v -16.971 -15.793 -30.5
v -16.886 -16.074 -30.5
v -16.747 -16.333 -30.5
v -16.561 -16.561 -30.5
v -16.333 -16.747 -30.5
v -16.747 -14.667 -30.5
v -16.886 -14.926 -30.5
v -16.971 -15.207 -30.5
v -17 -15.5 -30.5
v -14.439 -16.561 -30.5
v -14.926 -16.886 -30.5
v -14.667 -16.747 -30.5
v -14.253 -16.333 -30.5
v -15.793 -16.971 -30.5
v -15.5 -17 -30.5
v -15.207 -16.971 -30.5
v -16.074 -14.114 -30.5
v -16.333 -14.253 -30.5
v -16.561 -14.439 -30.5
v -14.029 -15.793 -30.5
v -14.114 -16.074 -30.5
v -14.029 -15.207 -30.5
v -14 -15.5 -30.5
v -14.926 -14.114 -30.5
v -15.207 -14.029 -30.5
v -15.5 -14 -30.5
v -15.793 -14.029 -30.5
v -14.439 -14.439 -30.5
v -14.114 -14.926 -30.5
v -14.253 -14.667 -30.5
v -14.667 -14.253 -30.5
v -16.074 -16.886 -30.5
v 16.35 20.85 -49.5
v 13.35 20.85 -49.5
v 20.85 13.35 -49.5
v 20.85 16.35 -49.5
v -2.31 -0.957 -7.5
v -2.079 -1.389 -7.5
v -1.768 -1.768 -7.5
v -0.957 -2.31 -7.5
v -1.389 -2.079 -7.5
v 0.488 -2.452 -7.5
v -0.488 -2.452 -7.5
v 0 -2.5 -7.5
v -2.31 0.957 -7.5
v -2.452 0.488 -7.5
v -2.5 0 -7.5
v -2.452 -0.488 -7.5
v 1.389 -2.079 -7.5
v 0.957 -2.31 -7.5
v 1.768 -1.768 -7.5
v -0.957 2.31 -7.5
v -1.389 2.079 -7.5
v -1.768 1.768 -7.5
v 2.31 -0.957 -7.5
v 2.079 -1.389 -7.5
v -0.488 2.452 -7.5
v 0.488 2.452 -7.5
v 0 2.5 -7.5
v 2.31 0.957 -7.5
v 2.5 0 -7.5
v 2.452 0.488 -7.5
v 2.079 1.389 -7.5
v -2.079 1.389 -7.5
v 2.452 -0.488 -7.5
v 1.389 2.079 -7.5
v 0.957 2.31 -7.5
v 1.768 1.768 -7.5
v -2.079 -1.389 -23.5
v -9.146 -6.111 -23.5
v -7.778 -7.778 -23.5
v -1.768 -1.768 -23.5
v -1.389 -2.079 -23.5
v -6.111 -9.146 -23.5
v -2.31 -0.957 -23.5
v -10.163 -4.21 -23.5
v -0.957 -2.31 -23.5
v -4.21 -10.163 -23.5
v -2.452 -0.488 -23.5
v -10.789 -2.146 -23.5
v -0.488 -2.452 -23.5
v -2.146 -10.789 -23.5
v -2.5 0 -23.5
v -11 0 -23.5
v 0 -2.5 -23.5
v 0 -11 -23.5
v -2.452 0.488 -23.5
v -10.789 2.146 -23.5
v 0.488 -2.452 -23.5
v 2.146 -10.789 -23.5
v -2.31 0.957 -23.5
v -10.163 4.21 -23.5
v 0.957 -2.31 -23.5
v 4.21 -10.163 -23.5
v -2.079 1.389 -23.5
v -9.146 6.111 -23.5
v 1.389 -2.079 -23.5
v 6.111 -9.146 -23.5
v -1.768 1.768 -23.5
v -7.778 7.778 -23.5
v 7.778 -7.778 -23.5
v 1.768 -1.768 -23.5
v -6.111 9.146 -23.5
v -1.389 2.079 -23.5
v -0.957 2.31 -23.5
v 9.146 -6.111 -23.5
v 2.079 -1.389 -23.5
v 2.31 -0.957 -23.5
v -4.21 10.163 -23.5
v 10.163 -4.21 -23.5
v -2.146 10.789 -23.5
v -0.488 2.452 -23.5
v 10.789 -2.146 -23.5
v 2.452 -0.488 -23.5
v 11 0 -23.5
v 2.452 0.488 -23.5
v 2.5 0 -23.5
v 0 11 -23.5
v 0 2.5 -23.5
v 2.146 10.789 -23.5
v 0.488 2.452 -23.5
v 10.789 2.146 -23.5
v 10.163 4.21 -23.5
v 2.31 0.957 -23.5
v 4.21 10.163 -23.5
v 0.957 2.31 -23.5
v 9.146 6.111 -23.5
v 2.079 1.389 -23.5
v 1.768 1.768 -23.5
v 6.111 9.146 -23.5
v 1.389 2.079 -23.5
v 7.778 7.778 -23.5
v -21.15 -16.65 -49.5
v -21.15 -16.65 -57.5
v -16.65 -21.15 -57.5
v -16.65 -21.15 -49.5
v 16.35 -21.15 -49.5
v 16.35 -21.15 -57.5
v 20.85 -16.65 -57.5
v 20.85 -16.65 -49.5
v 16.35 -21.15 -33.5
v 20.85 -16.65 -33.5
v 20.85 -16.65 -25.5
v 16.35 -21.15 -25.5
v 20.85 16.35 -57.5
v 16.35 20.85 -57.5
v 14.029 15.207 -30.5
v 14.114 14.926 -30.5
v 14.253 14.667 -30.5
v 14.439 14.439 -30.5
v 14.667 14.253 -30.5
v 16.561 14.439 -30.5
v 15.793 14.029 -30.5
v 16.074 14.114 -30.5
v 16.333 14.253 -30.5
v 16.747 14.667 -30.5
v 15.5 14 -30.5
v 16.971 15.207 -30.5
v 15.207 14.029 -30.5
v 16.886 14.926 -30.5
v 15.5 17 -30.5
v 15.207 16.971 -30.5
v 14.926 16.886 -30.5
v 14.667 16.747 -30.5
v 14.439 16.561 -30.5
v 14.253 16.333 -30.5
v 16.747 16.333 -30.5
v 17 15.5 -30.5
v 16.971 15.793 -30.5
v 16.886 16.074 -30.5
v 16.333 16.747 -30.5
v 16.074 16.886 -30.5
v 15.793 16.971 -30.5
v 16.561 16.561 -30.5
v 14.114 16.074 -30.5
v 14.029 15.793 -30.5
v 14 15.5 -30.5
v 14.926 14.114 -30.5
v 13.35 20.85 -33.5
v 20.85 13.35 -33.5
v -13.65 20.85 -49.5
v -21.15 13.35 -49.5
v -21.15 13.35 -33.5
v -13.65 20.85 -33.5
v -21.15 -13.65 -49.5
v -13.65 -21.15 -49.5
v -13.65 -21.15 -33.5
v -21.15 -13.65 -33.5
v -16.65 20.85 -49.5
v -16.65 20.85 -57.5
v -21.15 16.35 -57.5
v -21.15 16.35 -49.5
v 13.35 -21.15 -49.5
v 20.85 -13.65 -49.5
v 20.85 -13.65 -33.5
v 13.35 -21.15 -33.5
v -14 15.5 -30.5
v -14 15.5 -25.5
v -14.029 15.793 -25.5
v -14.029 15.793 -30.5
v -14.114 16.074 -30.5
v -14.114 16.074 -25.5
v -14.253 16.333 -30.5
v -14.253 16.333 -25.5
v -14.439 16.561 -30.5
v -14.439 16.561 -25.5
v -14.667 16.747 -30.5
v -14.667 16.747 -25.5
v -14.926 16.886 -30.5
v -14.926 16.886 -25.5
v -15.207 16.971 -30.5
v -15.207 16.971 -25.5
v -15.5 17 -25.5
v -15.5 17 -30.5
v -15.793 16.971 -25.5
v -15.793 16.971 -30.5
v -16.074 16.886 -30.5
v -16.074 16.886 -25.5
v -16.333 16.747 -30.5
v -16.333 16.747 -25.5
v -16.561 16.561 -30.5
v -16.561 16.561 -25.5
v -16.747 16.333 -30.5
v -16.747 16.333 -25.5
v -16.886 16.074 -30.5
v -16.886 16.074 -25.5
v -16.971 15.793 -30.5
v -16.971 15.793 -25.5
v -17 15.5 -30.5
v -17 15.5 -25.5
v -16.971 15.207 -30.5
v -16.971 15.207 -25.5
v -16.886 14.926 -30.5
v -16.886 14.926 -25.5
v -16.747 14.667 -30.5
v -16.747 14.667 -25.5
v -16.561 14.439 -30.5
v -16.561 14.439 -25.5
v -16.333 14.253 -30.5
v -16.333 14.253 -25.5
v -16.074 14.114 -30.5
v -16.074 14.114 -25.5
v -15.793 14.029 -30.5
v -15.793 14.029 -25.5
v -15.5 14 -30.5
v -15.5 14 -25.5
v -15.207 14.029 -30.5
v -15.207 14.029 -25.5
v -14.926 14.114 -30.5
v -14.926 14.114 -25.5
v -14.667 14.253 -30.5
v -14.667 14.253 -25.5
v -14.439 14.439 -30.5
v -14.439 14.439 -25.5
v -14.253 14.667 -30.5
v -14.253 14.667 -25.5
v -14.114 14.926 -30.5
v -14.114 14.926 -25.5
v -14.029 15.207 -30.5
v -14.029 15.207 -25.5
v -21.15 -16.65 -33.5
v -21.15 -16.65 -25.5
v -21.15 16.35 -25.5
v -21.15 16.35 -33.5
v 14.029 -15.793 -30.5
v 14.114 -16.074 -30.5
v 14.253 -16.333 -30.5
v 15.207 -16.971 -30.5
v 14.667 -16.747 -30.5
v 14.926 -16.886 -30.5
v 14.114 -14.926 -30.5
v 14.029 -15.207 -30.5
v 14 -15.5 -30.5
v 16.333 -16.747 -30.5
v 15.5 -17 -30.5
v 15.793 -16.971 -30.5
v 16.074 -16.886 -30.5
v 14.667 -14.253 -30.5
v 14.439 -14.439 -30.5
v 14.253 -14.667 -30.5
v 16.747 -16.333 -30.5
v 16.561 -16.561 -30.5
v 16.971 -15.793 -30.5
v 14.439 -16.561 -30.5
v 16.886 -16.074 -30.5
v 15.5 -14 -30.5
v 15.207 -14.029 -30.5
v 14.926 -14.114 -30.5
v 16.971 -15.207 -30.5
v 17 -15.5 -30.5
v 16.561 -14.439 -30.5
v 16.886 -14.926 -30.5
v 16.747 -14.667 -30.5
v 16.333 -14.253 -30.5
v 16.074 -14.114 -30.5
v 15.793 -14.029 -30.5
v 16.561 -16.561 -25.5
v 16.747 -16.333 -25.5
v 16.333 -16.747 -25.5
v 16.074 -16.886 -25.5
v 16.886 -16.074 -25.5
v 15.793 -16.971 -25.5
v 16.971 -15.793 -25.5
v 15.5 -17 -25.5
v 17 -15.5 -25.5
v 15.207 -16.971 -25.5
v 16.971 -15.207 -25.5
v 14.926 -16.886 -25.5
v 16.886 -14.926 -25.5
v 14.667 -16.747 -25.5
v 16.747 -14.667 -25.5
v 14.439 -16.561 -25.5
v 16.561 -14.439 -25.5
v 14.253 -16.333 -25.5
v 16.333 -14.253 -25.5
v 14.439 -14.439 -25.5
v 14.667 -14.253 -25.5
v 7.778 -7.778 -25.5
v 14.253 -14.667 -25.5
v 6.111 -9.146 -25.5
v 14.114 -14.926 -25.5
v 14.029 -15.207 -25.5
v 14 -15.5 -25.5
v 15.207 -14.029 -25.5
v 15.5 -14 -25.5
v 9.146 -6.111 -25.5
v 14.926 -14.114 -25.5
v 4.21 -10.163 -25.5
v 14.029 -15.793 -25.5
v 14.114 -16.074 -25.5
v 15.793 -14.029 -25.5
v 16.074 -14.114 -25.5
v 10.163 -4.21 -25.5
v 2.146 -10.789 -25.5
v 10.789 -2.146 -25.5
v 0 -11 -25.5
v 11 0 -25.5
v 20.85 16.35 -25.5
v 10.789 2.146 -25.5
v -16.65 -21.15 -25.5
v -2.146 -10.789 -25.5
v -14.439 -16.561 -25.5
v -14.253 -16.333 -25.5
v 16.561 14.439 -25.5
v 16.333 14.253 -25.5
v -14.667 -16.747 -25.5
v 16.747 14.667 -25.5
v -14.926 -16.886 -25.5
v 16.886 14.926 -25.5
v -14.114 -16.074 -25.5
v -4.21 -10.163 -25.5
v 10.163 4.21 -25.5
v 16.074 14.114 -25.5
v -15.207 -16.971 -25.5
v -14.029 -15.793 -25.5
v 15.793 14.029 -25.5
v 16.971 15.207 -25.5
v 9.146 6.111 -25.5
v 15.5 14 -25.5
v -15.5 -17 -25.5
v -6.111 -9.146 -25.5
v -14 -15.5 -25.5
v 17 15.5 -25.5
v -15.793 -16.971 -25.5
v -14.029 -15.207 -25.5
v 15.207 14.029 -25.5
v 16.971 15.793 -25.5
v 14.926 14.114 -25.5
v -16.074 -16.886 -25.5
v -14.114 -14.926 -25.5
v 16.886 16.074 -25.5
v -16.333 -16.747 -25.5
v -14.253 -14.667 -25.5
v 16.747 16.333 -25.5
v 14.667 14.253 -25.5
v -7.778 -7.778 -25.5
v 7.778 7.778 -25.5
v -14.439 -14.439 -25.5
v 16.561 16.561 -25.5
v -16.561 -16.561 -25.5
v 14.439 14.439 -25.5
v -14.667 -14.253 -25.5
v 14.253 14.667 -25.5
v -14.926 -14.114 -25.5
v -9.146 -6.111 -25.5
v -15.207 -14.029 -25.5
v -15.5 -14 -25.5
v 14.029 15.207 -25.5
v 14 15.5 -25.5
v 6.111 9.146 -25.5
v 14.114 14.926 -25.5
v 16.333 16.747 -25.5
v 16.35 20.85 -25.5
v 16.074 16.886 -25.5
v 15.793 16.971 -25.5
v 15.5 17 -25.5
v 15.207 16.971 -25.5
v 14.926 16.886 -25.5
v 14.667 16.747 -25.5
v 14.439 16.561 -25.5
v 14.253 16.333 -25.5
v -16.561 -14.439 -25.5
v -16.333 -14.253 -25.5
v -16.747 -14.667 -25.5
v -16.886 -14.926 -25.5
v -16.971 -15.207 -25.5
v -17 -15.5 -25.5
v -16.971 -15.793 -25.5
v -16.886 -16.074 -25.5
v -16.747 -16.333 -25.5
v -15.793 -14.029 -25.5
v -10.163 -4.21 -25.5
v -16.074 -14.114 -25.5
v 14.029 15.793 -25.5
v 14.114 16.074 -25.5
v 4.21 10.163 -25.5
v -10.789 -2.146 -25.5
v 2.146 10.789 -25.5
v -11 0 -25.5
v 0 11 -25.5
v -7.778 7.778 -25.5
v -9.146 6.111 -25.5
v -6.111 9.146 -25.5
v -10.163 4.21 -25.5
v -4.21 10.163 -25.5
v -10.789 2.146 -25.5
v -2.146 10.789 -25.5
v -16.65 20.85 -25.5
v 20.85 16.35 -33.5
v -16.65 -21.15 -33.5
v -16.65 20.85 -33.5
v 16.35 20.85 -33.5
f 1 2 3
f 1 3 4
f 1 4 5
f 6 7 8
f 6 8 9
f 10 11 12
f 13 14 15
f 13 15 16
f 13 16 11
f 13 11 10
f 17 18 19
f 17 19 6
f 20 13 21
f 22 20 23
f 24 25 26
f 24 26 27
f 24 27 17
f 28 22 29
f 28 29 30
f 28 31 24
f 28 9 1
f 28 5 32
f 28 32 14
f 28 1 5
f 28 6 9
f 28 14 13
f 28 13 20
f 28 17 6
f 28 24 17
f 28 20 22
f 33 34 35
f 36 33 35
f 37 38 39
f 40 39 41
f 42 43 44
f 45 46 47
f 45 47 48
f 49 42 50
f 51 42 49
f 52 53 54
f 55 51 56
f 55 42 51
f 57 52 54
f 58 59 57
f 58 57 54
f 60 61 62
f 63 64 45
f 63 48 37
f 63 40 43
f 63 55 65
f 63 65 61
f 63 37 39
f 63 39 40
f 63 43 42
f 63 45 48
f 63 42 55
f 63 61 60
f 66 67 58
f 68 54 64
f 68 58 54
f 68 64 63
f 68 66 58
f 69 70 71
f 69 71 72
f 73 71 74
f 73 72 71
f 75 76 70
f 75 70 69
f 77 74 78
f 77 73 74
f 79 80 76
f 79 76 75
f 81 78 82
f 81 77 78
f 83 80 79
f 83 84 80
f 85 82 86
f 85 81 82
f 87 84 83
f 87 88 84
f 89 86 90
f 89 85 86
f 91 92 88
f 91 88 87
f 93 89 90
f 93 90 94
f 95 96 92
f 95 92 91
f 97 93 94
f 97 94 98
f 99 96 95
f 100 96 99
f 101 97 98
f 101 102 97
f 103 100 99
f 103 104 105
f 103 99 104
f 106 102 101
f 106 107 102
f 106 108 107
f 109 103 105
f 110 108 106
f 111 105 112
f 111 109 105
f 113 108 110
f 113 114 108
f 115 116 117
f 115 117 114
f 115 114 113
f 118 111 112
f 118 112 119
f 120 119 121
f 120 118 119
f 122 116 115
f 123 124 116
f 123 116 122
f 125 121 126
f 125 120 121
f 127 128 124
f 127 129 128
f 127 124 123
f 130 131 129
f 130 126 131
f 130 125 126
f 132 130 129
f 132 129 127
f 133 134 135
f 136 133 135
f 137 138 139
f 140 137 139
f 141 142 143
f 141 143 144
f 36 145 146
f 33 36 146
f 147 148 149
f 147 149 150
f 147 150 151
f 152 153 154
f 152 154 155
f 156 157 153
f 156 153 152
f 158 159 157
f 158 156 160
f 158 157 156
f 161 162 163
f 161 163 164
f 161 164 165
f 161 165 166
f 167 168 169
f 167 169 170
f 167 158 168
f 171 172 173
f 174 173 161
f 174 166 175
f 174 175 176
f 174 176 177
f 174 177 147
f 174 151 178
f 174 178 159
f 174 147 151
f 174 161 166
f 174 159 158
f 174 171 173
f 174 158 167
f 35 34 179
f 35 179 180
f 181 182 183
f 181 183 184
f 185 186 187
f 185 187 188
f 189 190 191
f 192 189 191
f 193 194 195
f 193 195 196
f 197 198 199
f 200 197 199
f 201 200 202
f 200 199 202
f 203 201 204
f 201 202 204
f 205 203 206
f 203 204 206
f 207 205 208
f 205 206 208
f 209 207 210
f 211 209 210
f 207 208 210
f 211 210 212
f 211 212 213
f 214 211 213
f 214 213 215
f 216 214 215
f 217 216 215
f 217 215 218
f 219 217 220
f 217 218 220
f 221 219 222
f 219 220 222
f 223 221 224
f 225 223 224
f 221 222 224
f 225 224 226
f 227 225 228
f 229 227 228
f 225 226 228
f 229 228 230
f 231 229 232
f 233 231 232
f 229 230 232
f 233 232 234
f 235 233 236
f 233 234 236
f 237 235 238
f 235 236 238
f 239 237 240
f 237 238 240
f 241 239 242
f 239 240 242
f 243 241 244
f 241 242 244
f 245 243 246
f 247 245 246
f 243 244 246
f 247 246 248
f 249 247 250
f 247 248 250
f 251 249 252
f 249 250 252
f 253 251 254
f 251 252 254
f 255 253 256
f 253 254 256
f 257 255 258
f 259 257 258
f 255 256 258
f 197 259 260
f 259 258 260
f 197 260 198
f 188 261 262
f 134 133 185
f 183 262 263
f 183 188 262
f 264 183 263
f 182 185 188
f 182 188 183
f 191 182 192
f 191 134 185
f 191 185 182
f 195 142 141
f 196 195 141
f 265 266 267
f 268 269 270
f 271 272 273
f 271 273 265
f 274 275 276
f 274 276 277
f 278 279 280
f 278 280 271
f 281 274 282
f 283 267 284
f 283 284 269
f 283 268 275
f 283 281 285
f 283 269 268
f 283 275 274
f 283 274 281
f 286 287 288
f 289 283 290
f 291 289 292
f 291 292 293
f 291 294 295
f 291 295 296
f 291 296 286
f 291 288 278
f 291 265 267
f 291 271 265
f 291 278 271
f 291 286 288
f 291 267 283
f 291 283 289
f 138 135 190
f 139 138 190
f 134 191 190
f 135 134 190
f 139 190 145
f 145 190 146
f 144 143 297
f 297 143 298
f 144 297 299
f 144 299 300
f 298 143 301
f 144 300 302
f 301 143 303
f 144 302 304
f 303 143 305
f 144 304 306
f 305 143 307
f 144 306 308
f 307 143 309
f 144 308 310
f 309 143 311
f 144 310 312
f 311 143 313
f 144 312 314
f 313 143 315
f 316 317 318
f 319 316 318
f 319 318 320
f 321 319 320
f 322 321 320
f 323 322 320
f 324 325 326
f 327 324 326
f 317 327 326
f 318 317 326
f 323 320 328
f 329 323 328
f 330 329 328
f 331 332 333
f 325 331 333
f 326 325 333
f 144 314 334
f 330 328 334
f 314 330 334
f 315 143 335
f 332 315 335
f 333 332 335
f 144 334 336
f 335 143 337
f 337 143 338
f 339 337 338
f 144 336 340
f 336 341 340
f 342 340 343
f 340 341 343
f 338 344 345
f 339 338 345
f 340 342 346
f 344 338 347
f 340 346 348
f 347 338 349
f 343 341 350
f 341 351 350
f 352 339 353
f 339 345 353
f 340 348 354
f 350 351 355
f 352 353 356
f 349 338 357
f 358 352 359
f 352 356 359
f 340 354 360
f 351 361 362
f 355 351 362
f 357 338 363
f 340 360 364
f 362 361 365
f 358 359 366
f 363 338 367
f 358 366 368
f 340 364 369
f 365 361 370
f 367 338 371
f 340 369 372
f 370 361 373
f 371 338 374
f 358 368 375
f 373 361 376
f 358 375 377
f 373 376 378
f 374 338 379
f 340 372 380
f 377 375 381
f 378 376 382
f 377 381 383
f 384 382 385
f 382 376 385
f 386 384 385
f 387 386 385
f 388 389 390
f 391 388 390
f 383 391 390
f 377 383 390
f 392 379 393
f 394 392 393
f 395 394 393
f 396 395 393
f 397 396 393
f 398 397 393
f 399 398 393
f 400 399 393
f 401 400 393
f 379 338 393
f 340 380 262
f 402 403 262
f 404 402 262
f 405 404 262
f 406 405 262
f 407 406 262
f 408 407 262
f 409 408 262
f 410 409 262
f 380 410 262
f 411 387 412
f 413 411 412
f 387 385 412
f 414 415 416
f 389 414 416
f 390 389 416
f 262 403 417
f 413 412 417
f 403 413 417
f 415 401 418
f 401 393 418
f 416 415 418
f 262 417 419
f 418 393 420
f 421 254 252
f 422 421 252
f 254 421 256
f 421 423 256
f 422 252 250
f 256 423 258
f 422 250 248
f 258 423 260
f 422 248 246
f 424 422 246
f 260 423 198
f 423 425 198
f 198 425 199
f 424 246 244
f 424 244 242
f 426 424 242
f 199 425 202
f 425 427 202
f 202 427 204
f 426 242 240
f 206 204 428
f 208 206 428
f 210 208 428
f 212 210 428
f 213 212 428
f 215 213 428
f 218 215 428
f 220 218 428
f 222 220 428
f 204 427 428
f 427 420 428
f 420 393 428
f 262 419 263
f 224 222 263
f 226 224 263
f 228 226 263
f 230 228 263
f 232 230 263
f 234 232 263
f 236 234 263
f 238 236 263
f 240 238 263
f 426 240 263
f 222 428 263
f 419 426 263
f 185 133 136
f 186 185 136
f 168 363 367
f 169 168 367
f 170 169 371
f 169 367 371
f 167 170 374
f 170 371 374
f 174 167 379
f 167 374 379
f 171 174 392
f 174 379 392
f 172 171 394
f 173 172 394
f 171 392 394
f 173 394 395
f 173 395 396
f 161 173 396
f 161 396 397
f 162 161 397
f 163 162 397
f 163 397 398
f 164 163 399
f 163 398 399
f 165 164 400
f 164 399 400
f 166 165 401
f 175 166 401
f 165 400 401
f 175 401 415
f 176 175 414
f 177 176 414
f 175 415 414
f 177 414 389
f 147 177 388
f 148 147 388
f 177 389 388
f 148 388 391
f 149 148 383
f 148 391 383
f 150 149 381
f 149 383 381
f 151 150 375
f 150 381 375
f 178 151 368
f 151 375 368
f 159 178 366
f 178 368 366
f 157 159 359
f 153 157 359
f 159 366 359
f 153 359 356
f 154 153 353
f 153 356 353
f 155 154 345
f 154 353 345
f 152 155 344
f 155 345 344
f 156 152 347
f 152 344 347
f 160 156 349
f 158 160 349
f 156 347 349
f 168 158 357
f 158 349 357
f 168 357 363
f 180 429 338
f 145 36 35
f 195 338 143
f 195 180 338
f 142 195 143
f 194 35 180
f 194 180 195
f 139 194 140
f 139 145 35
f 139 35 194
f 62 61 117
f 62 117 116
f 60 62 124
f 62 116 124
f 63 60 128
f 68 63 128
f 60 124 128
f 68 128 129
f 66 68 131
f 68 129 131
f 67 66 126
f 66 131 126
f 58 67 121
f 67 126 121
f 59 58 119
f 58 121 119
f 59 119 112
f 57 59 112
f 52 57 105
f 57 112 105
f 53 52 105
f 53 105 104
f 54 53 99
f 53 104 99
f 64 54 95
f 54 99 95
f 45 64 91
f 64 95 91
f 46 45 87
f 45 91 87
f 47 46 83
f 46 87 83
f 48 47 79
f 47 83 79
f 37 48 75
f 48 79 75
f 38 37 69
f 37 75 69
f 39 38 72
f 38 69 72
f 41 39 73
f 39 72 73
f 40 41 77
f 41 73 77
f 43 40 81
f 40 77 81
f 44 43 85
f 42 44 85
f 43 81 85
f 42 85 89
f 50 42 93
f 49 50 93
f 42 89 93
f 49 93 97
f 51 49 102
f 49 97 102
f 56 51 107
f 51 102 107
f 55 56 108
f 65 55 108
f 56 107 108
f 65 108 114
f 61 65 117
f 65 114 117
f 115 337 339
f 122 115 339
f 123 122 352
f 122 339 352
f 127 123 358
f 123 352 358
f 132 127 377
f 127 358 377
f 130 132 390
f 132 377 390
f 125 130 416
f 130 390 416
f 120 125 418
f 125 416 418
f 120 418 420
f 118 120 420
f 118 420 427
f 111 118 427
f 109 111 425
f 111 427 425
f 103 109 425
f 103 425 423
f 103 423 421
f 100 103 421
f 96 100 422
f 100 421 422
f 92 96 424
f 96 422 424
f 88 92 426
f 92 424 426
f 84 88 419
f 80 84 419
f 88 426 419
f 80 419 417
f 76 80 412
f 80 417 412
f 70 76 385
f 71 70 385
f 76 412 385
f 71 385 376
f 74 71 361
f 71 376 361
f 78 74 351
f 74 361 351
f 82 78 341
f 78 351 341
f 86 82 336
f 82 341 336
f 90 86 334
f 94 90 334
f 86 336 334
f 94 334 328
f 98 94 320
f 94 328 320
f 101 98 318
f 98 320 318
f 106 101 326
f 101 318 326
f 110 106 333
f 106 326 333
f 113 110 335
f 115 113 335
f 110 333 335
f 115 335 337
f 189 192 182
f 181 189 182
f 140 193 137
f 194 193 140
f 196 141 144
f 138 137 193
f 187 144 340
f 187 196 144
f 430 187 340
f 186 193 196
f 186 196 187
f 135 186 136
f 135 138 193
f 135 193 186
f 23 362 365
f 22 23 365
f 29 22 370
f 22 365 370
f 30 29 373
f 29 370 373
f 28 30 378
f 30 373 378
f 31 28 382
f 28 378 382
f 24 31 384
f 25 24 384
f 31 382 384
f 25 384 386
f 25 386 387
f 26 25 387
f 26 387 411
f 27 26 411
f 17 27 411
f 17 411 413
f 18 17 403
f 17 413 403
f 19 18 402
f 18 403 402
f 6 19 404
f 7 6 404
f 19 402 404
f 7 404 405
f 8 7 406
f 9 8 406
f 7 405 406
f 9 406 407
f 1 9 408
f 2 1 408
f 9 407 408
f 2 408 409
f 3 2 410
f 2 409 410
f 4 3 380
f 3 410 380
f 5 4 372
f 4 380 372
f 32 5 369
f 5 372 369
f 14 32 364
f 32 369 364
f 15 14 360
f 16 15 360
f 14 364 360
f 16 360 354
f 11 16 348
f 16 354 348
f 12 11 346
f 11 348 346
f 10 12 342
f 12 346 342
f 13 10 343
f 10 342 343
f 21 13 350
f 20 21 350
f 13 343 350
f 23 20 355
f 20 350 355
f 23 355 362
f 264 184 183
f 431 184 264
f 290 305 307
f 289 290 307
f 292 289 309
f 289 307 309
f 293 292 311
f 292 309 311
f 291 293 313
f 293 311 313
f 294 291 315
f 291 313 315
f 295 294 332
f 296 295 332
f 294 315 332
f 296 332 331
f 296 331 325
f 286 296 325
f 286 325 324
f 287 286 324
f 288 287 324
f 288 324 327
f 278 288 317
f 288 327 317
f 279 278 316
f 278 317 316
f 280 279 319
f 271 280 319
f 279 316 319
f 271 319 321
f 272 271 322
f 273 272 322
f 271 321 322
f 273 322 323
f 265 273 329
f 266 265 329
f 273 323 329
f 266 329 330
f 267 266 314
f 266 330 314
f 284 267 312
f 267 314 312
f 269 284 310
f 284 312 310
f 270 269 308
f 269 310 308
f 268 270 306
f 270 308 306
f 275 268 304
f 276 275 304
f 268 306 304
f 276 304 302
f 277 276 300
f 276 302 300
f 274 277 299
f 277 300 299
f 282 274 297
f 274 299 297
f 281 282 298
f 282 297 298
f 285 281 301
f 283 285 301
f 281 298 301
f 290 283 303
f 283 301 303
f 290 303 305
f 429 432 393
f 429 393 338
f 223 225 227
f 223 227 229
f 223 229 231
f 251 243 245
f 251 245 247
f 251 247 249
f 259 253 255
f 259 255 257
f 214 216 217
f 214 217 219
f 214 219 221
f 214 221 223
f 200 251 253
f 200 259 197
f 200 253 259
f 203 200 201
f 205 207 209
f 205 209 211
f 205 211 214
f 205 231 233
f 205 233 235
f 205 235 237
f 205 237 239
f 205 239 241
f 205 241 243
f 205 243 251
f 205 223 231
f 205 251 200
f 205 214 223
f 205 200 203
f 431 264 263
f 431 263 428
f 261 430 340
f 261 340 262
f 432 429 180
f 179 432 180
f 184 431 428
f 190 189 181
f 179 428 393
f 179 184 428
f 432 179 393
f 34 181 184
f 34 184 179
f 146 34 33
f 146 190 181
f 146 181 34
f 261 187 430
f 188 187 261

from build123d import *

# Parameters (mm, degrees)
PAD_DEPTH    = 8
PAD001_DEPTH = 16
PAD002_DEPTH = 8
SKETCH004_R  = 11
PAD003_DEPTH = 2
SKETCH005_R  = 2.5
PAD004_DEPTH = 16
SKETCH006_R  = 1.5
POCKET_DEPTH = 5


with BuildPart() as part:
    # Sketch → Pad (new body)
    with BuildSketch(Plane.XY):
        Polygon((4.5, -4.5), (37.5, -4.5), (42, 0), (42, 33), (37.5, 37.5), (4.5, 37.5), (0, 33), (0, 0), align=None)
    extrude(amount=PAD_DEPTH)

    # Sketch002 (on Face10 of Pad) → Pad001 (join)
    with BuildSketch(Plane.XY.offset(8)):
        Polygon((7.5, 37.5), (34.5, 37.5), (42, 30), (42, 3), (34.5, -4.5), (7.5, -4.5), (0, 3), (0, 30), align=None)
    extrude(amount=PAD001_DEPTH)

    # Sketch003 (on Face15 of Pad001) → Pad002 (join)
    with BuildSketch(Plane.XY.offset(24)):
        Polygon((4.5, 37.5), (37.5, 37.5), (42, 33), (42, 0), (37.5, -4.5), (4.5, -4.5), (0, 0), (0, 33), align=None)
    extrude(amount=PAD002_DEPTH)

    # Sketch004 (on Face7 of Pad002) → Pad003 (join)
    with BuildSketch(Plane.XY.offset(32)):
        with Locations((21.15, 16.65)):
            Circle(SKETCH004_R)
    extrude(amount=PAD003_DEPTH)

    # Sketch005 (on Face27 of Pad003) → Pad004 (join)
    with BuildSketch(Plane.XY.offset(34)):
        with Locations((21.15, 16.65)):
            Circle(SKETCH005_R)
    extrude(amount=PAD004_DEPTH)

    # Sketch006 (on Face7 of Pad004) → Pocket (cut)
    with BuildSketch(Plane.XY.offset(32)):
        with Locations((5.65, 1.15)):
            Circle(SKETCH006_R)
        with Locations((36.65, 1.15)):
            Circle(SKETCH006_R)
        with Locations((36.65, 32.15)):
            Circle(SKETCH006_R)
        with Locations((5.65, 32.15)):
            Circle(SKETCH006_R)
    extrude(amount=-POCKET_DEPTH, mode=Mode.SUBTRACT)


with BuildPart() as part_1:
    # Body placement: moved
    add(part.part.moved(Location((-21.15, -16.65, -57.5))))


solid = part_1.part
